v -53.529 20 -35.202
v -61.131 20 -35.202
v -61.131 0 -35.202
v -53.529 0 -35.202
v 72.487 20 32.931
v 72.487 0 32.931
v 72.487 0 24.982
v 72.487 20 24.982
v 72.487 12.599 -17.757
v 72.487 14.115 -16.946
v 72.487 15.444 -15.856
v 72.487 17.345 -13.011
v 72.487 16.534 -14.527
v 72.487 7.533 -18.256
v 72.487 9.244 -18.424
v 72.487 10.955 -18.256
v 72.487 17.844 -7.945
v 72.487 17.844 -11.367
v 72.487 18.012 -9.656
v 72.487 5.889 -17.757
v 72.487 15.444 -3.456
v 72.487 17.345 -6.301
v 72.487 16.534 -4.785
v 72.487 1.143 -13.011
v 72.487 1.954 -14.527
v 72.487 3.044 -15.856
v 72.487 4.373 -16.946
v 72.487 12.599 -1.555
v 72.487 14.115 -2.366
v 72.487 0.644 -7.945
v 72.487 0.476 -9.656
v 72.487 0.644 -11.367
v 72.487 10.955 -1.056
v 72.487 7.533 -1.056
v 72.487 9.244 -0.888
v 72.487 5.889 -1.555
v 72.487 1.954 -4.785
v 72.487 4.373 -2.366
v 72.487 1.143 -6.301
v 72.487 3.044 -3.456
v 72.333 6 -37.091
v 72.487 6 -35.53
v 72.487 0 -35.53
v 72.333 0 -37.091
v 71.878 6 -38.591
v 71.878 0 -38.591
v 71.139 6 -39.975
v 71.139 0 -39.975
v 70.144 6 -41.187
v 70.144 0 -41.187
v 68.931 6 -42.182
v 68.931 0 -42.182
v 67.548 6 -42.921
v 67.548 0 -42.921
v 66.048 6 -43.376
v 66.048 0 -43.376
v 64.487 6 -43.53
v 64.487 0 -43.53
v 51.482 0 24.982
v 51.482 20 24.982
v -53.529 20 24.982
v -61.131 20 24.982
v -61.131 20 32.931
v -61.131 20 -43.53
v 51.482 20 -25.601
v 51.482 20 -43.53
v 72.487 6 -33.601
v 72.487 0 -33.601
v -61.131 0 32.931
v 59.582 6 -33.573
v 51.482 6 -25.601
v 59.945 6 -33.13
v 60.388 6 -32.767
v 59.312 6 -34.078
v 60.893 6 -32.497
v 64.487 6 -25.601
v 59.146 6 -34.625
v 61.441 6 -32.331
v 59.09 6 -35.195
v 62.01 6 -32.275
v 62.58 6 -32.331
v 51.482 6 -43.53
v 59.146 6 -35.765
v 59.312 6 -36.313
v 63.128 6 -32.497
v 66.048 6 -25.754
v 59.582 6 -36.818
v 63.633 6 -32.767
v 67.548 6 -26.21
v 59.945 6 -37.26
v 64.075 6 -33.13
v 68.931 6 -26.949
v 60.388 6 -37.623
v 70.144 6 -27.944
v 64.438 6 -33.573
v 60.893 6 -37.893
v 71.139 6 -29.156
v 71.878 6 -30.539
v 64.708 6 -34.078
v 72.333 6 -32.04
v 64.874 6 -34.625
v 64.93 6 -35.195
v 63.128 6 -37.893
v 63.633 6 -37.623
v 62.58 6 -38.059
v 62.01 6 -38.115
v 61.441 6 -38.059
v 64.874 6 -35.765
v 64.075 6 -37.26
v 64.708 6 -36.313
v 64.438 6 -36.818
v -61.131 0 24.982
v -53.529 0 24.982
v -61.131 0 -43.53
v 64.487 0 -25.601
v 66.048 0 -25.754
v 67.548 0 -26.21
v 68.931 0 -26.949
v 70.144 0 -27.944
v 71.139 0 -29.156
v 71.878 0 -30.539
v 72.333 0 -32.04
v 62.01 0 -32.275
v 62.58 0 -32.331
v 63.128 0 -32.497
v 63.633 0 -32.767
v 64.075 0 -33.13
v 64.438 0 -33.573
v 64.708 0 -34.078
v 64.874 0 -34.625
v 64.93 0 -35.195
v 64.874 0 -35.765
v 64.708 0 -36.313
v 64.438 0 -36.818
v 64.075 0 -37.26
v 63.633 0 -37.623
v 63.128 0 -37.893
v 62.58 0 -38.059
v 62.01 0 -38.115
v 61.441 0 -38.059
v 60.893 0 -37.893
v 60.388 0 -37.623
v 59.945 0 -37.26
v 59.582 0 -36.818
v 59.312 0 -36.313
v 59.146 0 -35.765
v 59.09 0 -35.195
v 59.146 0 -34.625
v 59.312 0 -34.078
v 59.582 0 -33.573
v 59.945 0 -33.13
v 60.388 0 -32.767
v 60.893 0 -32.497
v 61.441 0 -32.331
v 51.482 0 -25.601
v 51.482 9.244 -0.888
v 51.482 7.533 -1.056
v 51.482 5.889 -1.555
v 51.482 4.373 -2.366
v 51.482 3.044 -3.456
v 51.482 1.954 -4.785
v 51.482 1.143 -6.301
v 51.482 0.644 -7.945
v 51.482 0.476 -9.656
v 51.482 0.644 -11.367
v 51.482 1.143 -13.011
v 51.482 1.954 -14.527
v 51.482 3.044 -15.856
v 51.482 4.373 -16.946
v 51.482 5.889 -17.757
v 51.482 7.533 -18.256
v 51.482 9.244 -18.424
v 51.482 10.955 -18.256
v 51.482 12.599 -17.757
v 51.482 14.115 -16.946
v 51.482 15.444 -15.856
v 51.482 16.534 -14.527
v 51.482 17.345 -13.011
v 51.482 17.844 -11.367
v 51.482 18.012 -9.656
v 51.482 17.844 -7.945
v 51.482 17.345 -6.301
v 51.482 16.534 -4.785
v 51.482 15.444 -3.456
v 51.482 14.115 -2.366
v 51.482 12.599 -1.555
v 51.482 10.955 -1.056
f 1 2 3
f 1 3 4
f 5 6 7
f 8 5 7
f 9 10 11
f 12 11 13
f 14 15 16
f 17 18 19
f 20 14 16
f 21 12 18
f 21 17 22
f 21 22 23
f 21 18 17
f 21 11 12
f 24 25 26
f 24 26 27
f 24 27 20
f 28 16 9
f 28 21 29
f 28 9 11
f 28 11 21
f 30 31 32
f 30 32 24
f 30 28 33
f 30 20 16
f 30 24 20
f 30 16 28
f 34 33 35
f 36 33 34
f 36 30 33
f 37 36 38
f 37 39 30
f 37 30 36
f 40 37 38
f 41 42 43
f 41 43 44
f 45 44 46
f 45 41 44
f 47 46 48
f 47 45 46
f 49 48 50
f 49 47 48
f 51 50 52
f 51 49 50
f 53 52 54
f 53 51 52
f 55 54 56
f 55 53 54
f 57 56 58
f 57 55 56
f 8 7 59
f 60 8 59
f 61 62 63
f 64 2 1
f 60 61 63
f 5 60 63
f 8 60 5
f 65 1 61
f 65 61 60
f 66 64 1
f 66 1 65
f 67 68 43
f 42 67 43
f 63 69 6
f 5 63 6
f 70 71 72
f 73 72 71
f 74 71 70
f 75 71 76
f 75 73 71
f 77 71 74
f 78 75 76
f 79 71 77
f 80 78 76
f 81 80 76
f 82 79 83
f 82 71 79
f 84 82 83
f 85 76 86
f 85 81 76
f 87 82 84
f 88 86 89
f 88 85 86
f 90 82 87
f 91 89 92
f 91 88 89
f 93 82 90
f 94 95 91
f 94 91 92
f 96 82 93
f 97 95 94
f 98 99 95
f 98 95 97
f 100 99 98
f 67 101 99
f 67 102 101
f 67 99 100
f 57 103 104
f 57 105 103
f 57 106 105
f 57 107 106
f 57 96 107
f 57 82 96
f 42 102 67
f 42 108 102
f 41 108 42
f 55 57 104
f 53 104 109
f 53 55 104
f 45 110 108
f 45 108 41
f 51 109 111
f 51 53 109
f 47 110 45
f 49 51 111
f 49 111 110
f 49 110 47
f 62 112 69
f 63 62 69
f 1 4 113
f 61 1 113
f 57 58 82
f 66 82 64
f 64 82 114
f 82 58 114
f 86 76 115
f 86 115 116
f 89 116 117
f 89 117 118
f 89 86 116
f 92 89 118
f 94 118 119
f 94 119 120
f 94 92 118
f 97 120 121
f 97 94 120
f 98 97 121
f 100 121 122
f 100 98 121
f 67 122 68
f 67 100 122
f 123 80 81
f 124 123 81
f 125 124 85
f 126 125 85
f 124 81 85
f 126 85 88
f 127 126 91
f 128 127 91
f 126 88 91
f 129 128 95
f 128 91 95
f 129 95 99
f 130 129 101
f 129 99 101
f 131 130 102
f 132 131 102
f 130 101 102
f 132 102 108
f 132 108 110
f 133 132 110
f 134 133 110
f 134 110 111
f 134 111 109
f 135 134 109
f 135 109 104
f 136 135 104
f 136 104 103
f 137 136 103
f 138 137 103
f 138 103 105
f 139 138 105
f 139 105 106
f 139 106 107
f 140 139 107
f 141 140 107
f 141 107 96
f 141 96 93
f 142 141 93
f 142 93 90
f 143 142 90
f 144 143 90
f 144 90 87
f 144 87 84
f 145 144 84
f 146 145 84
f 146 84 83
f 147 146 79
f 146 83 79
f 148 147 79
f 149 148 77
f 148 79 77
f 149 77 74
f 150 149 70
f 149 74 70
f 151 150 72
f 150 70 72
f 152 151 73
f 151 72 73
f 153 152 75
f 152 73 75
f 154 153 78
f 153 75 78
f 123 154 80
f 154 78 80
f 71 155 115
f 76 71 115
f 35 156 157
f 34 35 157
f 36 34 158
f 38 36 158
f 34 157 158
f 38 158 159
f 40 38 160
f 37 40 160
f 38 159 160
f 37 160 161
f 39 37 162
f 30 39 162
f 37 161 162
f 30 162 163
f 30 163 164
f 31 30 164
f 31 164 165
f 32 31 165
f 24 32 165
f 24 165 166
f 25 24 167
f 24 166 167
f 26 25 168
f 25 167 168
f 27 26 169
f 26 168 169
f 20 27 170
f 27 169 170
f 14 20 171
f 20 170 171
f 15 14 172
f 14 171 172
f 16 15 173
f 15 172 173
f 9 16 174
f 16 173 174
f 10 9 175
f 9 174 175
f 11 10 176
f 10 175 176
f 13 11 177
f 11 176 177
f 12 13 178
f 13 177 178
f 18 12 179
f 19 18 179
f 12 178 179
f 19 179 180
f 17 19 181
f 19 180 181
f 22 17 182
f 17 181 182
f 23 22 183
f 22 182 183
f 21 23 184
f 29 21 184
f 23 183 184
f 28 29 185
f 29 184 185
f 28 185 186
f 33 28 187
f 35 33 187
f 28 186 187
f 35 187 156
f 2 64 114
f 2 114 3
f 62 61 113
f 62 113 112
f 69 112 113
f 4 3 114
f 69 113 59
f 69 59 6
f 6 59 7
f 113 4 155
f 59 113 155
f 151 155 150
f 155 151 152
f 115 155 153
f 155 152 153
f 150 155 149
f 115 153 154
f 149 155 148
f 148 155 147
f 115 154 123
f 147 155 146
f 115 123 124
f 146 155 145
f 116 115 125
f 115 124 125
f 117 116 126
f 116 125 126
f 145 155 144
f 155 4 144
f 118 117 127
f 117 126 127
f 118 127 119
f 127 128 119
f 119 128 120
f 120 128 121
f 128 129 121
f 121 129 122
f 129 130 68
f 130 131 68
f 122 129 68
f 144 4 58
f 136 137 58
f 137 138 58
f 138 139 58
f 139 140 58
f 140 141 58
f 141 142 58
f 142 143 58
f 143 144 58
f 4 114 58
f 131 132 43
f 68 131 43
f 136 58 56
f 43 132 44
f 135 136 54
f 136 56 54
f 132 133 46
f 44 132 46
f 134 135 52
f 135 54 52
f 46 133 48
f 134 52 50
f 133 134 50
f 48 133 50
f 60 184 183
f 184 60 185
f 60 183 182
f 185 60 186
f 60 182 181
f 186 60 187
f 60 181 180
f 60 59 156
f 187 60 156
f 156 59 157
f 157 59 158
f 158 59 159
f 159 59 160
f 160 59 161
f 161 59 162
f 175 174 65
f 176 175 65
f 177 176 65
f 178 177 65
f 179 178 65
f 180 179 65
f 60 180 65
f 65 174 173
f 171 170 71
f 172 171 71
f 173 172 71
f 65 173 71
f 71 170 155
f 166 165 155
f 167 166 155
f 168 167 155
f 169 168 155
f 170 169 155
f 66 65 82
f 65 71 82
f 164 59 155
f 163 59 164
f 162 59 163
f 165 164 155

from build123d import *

# Parameters (mm, degrees)
BOSS_EXTRUDE1_DEPTH = 20
FILLET1_R           = 8
SKETCH2_W           = 25.416334399
SKETCH2_H           = 26.69942318
CUT_EXTRUDE1_DEPTH  = 14
SKETCH3_R           = 2.920242488
CUT_EXTRUDE2_DEPTH  = 7
SKETCH4_R           = 8.768125441
BOSS_EXTRUDE2_DEPTH = 21.004475


with BuildPart() as part:
    # Sketch1 → Boss-Extrude1 (new body)
    with BuildSketch(Plane(origin=(0, 0, 0), x_dir=(1, 0, 0), z_dir=(0, 1, 0))):
        Polygon((-61.131192742, -32.931354604), (72.486832261, -32.931354604), (72.486832261, -24.982406941), (51.482357687, -24.982406941), (51.482357687, 25.600715877), (72.486832261, 25.600715877), (72.486832261, 43.529951488), (-61.131192742, 43.529951488), (-61.131192742, 35.202482508), (-53.52918853, 35.202482508), (-53.52918853, -24.982406941), (-61.131192742, -24.982406941), align=None)
    extrude(amount=BOSS_EXTRUDE1_DEPTH)

    # Fillet1
    fillet1_edges = [part.edges().sort_by_distance(p)[0] for p in [
        (72.486832261, 10, -43.529951488),
        (72.486832261, 10, -25.600715877),
    ]]
    fillet(fillet1_edges, radius=FILLET1_R)

    # Sketch2 → Cut-Extrude1 (cut)
    with BuildSketch(Plane(origin=(0, 20, 0), x_dir=(1, 0, 0), z_dir=(0, 1, 0))):
        with Locations((64.190524887, 34.382431467)):
            Rectangle(SKETCH2_W, SKETCH2_H)
    extrude(amount=-CUT_EXTRUDE1_DEPTH, mode=Mode.SUBTRACT)

    # Sketch3 → Cut-Extrude2 (cut, through all)
    with BuildSketch(Plane(origin=(0, 6, 0), x_dir=(1, 0, 0), z_dir=(0, 1, 0))):
        with Locations(Location((62.010238624, 35.19513013, 0), (0, 0, 270))):  # turned: the seam where the file's is
            Circle(SKETCH3_R)
    extrude(amount=-CUT_EXTRUDE2_DEPTH, mode=Mode.SUBTRACT)

    # Sketch4 → Boss-Extrude2 (add)
    with BuildSketch(Plane(origin=(51.482357687, 0, 0), x_dir=(0, 0, -1), z_dir=(1, 0, 0))):
        with Locations(Location((9.656027264, 9.243975153, 0), (0, 0, 180))):  # turned: the seam where the file's is
            Circle(SKETCH4_R)
    extrude(amount=BOSS_EXTRUDE2_DEPTH)


solid = part.part
